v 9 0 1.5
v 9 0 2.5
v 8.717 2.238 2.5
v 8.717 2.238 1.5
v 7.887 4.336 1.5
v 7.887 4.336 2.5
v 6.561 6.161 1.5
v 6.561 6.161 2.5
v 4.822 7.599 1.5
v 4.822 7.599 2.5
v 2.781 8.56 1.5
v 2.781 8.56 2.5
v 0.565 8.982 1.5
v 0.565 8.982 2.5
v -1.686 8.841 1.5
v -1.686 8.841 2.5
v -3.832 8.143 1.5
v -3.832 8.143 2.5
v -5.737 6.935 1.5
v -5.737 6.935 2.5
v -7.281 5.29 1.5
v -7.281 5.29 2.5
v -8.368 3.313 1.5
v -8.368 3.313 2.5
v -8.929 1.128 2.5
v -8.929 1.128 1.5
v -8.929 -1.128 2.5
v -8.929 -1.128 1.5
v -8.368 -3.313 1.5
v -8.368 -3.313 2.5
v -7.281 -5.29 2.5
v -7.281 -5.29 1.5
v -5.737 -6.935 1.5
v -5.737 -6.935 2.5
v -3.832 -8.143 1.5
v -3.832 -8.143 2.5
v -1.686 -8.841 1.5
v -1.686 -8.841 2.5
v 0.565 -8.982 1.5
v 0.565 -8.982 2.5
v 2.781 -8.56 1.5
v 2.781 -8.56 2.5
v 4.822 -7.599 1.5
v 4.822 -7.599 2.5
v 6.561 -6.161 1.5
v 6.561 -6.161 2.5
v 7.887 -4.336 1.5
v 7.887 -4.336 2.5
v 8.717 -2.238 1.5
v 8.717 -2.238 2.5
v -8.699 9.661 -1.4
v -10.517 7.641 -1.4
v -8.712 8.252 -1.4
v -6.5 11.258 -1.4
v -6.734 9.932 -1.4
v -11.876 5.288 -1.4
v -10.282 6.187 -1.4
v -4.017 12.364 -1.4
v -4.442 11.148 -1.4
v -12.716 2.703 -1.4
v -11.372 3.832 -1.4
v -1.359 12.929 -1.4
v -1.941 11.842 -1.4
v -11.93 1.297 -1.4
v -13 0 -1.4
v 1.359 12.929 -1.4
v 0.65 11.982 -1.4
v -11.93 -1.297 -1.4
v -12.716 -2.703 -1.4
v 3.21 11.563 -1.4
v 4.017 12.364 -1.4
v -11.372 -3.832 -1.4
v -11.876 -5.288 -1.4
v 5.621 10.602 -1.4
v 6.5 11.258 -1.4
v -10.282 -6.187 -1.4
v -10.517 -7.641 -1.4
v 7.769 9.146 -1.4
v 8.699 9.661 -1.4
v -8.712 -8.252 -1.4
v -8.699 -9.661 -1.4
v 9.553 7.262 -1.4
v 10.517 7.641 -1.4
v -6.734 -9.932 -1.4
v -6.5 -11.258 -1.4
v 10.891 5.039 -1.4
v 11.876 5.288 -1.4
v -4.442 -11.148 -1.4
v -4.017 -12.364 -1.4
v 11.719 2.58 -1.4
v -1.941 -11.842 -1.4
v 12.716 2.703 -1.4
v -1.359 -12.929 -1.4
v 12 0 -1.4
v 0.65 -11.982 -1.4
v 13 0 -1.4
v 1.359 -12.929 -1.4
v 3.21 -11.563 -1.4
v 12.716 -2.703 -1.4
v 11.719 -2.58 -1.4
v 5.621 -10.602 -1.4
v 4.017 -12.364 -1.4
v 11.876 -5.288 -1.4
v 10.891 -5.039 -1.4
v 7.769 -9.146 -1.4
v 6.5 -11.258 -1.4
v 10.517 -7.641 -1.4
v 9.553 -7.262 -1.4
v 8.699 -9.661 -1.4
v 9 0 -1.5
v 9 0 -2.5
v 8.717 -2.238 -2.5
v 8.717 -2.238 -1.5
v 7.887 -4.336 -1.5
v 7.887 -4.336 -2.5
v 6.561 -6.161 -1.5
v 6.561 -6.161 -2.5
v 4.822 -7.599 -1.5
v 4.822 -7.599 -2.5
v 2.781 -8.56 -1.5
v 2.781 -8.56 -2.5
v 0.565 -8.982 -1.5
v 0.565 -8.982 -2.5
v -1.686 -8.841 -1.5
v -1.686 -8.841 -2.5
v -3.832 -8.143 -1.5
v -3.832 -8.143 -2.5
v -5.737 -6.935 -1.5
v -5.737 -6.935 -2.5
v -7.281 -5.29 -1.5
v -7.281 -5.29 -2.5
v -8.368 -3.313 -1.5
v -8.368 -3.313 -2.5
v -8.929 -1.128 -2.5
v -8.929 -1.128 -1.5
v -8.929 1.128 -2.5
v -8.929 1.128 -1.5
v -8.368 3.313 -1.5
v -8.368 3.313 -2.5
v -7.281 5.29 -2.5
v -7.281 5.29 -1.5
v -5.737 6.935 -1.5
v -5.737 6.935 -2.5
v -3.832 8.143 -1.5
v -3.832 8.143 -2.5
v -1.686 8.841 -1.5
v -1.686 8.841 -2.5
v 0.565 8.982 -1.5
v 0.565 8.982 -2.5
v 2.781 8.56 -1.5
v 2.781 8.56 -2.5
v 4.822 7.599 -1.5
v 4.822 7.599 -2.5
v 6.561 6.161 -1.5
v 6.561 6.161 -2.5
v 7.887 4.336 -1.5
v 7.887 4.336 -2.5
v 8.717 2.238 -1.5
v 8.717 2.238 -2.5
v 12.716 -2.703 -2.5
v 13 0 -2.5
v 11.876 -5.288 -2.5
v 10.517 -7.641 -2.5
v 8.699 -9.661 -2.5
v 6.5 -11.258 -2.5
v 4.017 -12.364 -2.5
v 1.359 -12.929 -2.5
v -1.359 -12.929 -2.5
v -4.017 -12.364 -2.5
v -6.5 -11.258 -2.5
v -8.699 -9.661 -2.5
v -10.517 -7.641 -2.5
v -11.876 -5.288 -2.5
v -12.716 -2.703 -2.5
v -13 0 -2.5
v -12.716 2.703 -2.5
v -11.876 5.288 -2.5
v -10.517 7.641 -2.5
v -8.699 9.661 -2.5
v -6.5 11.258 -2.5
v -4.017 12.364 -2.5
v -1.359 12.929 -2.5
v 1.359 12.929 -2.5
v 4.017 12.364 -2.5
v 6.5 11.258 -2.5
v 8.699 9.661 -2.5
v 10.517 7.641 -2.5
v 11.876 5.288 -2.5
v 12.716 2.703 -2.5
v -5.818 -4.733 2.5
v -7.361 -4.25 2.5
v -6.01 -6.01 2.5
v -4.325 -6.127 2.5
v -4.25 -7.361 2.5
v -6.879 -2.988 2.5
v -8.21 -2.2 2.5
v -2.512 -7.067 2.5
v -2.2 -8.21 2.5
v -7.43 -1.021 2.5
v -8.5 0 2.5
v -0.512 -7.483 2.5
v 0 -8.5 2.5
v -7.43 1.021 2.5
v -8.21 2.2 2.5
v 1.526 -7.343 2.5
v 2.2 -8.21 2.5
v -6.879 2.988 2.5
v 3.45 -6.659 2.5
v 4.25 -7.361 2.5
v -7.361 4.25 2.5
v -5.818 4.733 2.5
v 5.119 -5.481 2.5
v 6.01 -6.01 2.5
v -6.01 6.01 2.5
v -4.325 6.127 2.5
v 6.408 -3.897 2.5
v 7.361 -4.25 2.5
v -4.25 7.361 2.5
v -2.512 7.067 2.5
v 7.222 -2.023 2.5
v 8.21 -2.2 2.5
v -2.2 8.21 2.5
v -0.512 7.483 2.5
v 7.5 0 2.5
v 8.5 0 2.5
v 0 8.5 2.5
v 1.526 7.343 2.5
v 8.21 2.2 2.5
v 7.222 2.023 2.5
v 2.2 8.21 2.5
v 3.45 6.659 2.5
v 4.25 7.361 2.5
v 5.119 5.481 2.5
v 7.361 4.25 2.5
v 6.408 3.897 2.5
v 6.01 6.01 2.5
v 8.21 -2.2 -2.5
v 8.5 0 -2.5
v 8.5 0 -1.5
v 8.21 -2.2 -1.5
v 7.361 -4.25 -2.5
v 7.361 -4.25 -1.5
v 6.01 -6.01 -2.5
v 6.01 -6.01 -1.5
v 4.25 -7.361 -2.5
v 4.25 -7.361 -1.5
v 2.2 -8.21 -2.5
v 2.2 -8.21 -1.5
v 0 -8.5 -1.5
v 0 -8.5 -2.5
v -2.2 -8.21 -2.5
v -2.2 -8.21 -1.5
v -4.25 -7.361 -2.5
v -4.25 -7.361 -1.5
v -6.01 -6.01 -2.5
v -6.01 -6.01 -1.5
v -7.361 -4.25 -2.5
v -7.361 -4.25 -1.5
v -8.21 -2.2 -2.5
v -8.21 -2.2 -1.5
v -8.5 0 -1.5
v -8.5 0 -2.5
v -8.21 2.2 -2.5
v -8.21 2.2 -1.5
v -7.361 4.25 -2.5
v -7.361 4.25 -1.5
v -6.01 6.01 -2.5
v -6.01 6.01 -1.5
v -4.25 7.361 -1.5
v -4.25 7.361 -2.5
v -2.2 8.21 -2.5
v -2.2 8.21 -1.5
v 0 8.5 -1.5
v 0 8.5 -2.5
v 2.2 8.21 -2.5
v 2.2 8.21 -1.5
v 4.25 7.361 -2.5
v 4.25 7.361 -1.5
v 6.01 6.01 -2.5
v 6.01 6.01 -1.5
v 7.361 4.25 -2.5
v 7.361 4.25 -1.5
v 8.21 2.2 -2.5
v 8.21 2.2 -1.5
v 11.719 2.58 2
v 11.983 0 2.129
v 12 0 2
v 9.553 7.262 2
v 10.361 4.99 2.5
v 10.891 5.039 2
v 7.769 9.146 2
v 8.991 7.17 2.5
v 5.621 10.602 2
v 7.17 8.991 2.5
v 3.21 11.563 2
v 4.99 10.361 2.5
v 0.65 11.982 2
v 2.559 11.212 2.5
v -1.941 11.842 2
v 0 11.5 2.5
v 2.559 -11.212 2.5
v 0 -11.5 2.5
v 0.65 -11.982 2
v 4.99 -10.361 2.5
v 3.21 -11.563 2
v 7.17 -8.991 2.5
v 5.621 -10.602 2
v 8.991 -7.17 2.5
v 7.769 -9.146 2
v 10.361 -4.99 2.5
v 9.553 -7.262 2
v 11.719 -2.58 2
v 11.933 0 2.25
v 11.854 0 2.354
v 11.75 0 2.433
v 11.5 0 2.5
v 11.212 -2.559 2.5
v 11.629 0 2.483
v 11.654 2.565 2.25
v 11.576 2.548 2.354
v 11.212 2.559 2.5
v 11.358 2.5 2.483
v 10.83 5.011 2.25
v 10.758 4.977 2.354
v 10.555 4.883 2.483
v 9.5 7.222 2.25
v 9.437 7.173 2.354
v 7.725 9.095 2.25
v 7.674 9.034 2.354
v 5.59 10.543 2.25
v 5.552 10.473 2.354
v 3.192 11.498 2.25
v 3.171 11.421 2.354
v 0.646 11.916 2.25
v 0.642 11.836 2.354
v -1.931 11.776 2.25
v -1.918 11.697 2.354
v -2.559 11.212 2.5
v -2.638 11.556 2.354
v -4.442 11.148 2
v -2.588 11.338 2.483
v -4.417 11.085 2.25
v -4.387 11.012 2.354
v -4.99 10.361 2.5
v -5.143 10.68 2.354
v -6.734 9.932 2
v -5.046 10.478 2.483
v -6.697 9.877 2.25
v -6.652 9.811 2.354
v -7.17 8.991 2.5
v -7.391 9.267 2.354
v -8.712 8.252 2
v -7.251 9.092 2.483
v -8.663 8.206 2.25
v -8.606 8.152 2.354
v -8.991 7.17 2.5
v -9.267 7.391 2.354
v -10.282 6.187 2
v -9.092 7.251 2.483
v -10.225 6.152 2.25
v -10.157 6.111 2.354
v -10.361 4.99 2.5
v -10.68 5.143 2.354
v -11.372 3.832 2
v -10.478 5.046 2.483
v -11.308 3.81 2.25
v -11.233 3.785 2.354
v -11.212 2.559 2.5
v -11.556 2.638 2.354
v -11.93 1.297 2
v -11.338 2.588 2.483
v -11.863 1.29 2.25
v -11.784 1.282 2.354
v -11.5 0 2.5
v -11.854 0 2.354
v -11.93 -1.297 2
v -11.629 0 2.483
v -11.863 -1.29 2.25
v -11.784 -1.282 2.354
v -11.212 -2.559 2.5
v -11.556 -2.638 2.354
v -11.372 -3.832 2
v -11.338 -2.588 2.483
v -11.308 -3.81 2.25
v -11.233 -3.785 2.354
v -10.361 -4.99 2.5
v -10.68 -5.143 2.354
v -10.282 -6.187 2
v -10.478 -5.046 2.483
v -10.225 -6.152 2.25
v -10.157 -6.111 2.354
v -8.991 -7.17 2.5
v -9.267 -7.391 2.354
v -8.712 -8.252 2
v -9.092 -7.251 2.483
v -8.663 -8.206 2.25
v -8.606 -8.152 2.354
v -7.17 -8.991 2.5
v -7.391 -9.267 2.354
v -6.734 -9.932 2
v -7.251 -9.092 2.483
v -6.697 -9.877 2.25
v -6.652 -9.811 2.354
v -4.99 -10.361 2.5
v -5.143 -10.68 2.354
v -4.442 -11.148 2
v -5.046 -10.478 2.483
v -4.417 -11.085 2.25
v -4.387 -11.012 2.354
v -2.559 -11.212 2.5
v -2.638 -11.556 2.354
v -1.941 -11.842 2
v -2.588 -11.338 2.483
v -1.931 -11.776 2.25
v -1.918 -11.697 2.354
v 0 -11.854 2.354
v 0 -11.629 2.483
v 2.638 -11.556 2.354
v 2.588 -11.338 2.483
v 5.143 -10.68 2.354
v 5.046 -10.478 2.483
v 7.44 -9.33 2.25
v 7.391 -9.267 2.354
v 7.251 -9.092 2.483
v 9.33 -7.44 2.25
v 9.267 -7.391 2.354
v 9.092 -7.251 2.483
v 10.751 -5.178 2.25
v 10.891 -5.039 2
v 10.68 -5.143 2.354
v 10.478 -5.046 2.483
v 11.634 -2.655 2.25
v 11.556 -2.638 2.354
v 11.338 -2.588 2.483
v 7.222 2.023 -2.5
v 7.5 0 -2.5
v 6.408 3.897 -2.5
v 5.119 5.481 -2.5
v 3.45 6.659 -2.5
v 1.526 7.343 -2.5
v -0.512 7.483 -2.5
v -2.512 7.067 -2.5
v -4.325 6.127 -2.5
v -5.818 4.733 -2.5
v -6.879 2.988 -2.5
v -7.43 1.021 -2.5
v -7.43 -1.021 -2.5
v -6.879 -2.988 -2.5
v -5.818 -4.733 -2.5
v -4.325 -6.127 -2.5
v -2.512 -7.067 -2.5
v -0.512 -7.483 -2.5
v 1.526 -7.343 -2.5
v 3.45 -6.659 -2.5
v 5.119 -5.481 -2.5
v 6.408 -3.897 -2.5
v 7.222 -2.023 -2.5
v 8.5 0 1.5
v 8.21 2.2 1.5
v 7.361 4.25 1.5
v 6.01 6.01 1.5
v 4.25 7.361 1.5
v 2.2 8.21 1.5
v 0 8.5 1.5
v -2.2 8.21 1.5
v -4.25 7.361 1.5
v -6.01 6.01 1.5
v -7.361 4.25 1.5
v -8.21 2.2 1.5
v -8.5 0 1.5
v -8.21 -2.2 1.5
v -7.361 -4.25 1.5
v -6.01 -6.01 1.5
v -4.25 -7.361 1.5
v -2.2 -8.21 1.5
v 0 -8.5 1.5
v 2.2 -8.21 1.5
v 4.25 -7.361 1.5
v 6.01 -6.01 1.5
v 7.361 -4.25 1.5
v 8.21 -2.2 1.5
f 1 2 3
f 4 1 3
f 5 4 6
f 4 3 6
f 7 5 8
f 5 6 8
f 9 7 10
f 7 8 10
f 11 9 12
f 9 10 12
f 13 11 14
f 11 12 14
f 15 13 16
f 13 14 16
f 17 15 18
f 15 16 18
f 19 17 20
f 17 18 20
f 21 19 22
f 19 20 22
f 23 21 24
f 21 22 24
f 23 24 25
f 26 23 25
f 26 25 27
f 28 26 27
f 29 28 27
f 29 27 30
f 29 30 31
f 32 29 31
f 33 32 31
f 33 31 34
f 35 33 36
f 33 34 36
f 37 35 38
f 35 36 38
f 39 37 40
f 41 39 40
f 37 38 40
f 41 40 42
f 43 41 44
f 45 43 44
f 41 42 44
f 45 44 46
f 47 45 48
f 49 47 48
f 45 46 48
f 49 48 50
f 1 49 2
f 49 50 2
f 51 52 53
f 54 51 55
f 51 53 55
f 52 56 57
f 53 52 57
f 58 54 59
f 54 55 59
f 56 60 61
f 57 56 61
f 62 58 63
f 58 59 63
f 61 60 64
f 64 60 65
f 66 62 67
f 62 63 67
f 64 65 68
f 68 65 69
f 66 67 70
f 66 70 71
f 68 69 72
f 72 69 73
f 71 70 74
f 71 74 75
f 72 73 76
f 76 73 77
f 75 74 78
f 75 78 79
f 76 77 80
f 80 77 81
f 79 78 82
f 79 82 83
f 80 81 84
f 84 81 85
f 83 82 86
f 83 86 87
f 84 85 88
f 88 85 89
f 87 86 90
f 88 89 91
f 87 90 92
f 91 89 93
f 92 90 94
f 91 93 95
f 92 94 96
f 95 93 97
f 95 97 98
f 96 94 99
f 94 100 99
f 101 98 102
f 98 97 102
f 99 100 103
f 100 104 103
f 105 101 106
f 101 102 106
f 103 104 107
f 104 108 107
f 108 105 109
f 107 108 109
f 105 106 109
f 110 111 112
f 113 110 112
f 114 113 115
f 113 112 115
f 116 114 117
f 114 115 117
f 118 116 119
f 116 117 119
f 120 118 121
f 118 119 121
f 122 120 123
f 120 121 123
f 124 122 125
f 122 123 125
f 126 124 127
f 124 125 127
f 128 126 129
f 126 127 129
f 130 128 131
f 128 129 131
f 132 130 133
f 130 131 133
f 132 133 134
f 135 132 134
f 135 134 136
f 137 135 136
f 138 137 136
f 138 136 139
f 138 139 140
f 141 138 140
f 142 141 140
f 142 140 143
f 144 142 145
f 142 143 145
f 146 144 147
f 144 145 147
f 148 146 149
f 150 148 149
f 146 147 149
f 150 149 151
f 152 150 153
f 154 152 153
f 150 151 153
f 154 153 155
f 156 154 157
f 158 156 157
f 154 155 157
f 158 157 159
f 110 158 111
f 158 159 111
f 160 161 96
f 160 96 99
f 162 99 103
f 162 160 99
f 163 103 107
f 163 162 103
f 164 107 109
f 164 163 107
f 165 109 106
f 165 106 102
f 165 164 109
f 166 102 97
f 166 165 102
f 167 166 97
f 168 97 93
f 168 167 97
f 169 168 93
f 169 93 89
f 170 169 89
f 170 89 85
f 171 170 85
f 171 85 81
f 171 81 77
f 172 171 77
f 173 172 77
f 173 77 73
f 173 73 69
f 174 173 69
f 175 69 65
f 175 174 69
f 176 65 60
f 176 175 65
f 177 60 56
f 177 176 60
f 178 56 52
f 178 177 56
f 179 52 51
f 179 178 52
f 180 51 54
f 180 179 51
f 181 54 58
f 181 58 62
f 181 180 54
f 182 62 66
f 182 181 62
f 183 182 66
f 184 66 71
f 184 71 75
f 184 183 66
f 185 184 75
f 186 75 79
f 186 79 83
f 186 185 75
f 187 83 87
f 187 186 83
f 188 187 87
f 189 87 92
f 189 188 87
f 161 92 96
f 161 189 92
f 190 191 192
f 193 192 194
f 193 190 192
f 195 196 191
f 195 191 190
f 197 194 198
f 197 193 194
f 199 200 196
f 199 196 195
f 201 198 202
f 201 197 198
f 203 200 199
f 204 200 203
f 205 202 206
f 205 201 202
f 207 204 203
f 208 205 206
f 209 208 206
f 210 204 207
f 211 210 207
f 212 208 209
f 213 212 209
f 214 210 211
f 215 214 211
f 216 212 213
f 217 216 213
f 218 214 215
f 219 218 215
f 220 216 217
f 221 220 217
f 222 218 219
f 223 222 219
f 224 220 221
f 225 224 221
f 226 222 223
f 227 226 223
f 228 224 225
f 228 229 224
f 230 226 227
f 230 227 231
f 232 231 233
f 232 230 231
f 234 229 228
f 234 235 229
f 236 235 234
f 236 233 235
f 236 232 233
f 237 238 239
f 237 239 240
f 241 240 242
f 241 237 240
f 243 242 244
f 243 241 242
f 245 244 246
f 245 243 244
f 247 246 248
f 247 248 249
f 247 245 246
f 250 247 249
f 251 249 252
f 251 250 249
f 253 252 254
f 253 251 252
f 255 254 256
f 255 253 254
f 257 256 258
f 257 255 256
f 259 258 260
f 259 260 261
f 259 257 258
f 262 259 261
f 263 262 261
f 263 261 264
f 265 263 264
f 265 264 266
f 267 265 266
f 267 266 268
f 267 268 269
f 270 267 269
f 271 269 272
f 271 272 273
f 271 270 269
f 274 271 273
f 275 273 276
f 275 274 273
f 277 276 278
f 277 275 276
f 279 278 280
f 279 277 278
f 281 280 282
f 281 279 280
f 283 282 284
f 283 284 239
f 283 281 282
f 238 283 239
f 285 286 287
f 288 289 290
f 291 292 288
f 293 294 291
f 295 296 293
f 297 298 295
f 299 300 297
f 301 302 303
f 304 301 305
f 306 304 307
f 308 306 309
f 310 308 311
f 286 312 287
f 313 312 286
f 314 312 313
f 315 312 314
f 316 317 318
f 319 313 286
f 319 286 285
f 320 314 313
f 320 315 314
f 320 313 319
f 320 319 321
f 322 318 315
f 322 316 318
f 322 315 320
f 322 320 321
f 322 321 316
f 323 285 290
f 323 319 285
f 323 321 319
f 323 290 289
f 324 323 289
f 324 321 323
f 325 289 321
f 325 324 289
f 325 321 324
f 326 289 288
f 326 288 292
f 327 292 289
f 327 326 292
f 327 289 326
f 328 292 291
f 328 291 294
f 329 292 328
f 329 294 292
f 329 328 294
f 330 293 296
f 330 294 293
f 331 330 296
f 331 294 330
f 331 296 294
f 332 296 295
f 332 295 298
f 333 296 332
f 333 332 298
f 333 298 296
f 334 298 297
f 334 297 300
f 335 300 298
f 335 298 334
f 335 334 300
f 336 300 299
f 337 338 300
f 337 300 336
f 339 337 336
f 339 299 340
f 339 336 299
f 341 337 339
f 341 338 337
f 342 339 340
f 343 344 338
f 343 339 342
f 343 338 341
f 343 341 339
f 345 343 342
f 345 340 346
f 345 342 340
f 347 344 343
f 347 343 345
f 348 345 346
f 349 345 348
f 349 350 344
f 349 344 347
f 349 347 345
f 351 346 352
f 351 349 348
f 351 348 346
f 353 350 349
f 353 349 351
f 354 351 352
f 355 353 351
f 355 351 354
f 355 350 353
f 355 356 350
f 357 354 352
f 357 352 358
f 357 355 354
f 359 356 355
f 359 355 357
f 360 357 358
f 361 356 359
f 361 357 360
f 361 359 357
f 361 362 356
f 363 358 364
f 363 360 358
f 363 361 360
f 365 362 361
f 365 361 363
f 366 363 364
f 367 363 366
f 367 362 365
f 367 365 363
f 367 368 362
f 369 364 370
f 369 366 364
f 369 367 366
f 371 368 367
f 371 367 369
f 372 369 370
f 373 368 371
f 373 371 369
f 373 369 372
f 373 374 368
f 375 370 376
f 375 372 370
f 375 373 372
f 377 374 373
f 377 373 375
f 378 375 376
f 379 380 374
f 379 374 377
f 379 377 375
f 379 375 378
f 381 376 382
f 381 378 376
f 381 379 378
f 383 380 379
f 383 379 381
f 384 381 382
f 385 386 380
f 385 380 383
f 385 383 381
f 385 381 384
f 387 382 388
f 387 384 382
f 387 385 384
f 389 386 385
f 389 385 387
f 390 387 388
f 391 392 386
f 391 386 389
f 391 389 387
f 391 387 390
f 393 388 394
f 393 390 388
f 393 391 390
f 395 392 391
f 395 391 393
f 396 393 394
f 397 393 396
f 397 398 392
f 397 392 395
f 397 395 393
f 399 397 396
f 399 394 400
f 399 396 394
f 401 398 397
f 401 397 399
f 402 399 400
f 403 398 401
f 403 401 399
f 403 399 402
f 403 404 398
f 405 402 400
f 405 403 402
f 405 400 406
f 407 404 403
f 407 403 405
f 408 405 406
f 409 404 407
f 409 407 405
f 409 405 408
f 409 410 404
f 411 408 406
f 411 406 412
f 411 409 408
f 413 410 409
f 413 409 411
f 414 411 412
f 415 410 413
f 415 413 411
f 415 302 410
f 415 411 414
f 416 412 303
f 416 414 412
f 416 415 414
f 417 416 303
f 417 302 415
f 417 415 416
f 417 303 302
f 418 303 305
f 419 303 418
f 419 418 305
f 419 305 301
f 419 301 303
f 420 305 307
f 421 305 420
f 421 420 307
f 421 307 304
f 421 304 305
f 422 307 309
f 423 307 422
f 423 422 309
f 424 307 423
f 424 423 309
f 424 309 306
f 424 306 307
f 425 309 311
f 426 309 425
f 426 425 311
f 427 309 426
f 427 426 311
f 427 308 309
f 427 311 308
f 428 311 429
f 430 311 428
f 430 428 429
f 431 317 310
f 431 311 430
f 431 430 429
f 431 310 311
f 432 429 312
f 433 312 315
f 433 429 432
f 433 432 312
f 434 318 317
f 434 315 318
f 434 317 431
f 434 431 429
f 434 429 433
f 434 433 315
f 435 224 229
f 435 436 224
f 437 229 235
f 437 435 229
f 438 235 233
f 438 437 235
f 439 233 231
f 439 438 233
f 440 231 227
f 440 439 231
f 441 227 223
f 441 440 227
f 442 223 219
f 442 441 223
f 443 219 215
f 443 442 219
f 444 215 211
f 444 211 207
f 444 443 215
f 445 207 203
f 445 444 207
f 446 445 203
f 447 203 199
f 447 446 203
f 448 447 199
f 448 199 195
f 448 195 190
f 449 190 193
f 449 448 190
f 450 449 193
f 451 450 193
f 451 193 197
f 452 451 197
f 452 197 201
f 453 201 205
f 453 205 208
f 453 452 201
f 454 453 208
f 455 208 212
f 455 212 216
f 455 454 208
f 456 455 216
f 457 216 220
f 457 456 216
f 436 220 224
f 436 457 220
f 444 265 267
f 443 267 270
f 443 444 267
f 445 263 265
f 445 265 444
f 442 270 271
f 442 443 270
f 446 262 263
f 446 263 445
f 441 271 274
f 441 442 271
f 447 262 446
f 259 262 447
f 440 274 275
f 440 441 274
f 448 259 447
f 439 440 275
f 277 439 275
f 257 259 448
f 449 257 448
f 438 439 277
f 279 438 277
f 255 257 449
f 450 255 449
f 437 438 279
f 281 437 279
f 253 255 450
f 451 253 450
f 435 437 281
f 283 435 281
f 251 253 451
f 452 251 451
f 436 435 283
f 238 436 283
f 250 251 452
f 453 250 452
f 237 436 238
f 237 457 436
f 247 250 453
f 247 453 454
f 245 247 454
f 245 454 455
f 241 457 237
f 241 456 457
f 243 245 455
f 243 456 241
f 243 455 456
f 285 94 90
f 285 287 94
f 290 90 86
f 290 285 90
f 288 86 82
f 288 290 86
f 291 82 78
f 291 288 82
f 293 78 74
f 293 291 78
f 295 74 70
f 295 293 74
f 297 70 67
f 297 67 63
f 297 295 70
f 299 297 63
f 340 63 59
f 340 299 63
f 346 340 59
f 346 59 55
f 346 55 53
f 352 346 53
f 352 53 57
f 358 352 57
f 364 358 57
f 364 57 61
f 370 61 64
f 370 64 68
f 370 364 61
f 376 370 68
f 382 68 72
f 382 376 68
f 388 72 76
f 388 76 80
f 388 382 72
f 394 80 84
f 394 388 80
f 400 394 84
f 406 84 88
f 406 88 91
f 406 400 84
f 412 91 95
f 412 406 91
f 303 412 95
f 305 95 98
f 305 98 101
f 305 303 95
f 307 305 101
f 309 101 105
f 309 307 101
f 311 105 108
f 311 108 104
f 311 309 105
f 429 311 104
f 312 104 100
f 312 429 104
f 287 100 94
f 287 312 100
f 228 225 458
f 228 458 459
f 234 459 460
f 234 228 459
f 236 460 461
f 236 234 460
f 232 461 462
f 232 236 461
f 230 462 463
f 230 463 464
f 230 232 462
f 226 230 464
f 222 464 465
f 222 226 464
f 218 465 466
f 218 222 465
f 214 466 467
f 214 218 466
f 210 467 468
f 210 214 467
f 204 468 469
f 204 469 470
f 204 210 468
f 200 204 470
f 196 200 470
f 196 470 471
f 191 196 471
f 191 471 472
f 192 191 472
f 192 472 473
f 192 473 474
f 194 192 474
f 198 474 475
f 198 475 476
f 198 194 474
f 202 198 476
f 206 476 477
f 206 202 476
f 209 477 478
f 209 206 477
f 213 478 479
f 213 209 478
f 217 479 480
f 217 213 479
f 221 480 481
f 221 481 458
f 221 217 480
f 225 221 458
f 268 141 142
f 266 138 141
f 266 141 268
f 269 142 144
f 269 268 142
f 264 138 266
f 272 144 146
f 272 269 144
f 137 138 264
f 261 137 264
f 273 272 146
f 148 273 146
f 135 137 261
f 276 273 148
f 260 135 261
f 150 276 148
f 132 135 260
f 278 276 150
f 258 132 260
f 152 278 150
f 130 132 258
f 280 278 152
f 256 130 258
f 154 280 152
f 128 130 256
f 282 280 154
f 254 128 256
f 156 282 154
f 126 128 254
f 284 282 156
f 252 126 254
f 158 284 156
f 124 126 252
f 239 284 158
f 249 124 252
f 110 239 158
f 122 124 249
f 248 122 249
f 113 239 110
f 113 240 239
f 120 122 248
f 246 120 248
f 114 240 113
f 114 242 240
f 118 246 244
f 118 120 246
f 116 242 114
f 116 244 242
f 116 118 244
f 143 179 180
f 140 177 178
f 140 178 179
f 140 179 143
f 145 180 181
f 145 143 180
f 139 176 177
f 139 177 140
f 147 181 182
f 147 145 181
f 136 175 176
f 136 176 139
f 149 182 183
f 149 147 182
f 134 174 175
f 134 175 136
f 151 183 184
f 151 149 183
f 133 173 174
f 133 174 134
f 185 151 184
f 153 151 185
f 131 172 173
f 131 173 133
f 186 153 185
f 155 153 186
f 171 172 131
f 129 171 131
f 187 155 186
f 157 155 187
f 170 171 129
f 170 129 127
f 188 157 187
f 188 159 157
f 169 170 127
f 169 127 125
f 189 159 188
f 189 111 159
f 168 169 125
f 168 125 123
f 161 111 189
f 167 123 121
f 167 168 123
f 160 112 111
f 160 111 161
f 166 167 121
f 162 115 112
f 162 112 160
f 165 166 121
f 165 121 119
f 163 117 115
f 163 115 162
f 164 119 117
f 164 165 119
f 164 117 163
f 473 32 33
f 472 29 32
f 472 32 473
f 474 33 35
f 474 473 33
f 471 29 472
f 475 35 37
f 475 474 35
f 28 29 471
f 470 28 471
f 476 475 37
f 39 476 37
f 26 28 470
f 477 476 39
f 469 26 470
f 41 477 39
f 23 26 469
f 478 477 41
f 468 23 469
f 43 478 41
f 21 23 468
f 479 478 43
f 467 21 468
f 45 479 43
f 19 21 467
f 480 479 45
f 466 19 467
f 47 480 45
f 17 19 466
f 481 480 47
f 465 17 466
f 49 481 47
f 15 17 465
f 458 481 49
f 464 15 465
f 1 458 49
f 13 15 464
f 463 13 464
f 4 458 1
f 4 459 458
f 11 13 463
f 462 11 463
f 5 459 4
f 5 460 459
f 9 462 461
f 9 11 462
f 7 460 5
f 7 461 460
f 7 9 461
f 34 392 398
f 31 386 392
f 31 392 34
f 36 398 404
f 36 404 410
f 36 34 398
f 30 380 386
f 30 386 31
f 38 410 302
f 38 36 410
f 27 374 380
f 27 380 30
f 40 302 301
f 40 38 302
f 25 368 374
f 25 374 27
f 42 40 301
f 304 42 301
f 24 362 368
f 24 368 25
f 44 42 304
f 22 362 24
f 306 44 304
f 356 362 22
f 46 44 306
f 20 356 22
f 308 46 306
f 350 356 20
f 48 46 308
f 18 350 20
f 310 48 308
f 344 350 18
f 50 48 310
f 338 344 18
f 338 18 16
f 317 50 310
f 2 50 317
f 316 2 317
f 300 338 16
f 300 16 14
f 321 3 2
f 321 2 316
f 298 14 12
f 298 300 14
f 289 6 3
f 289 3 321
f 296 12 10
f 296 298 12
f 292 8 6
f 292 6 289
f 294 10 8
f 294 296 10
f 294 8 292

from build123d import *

# Parameters (mm, degrees)
F0_R     = 12
F0_R_2   = 7.5
F1_DEPTH = 2.5
F2_R     = 0.5
F3_R     = 13
F3_R_2   = 10
F4_DEPTH = 1.1
F5_R     = 9
F5_R_2   = 8.5
F6_DEPTH = 1
F7_R     = 9
F7_R_2   = 8.5
F8_DEPTH = 1


with BuildPart() as f1:
    # F0 (on Top) → F1 (new body, symmetric)
    with BuildSketch(Plane.XY):
        Circle(F0_R)
        Circle(F0_R_2, mode=Mode.SUBTRACT)
    extrude(amount=F1_DEPTH, both=True)

    # F2
    f2_edges = [f1.edges().sort_by_distance(p)[0] for p in [
        (-12, 0, 2.5),
    ]]
    fillet(f2_edges, radius=F2_R)

    # F3 (on face) → F4 (join)
    with BuildSketch(Plane(origin=(0, 0, -2.5), x_dir=(1, 0, 0), z_dir=(0, 0, -1))):
        Circle(F3_R)
        Circle(F3_R_2, mode=Mode.SUBTRACT)
    extrude(amount=-F4_DEPTH)

    # F5 (on face) → F6 (cut)
    with BuildSketch(Plane(origin=(0, 0, -2.5), x_dir=(1, 0, 0), z_dir=(0, 0, -1))):
        Circle(F5_R)
        Circle(F5_R_2, mode=Mode.SUBTRACT)
    extrude(amount=-F6_DEPTH, mode=Mode.SUBTRACT)

    # F7 (on face) → F8 (cut)
    with BuildSketch(Plane.XY.offset(2.5)):
        Circle(F7_R)
        Circle(F7_R_2, mode=Mode.SUBTRACT)
    extrude(amount=-F8_DEPTH, mode=Mode.SUBTRACT)


solid = f1.part
